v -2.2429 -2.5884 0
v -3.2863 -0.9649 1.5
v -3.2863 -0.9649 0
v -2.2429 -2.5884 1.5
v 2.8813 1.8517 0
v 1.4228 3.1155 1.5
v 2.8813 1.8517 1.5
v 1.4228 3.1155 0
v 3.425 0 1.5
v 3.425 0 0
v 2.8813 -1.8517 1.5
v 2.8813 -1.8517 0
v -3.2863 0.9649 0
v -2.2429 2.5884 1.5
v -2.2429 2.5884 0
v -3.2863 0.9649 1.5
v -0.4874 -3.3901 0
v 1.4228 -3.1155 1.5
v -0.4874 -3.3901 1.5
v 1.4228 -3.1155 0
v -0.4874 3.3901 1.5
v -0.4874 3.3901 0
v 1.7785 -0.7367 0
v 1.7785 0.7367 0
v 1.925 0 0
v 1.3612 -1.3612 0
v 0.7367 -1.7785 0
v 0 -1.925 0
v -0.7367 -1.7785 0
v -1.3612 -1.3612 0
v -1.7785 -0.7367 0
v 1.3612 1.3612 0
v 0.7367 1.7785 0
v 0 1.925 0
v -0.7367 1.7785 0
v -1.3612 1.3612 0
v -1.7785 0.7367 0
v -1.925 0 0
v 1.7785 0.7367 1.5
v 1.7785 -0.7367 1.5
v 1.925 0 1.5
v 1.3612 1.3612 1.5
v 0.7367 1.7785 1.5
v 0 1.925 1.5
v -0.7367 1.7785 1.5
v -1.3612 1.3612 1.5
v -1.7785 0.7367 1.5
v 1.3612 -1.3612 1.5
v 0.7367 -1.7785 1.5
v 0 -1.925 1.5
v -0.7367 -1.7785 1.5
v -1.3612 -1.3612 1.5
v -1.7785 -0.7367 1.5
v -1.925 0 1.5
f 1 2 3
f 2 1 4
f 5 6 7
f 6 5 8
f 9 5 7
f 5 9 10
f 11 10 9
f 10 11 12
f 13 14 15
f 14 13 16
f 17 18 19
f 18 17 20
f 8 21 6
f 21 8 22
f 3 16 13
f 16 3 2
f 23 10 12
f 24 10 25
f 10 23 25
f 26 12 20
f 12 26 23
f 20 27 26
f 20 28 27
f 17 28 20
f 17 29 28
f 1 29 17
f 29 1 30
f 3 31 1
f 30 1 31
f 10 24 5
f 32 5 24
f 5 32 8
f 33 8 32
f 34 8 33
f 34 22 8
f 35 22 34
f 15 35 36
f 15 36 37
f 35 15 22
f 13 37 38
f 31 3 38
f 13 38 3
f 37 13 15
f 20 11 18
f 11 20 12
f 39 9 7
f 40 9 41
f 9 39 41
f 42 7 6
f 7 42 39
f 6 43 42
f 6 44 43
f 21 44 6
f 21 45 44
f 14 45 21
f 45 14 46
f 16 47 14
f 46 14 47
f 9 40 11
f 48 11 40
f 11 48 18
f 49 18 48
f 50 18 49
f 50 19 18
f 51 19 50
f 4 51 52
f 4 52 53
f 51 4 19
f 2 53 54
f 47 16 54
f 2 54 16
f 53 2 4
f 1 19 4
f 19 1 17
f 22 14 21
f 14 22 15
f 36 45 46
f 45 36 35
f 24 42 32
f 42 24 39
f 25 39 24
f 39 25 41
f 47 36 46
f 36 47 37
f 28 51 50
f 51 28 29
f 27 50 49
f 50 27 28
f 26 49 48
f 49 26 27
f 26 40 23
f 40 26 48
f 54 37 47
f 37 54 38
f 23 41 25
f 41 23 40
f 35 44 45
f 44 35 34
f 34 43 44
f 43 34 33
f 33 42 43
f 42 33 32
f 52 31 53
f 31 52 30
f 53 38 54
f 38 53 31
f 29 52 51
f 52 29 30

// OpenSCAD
// file: roundedsquare.scad
module roundedSquare(size=[10,10], radius=1, center=false, $fn=16) {
    size1 = (size+0==size) ? [size,size] : size;
    if (radius <= 0) {
        square(size1, center=center);
    }
    else {
        translate(center ? -size1/2 : [0,0])
        hull() {
            translate([radius,radius]) circle(r=radius);
            translate([size1[0]-radius,radius]) circle(r=radius);
            translate([size1[0]-radius,size1[1]-radius]) circle(r=radius);
            translate([radius,size1[1]-radius]) circle(r=radius);
        }
    }
}

module roundedCube(size=[10,10,10], radius=1, center=false, $fn=16) {
    linear_extrude(height=size[2])
    roundedSquare(size=[size[0],size[1]], radius=radius, center=center);
}

module roundedOpenTopBox(size=[10,10,10], radius=2, wall=1, solid=false) {
    render(convexity=2)
    difference() {
        linear_extrude(height=size[2]) roundedSquare(size=[size[0],size[1]], radius=radius);
        if (!solid) {
            translate([0,0,wall])
            linear_extrude(height=size[2]-wall) 
            translate([wall,wall]) roundedSquare(size=[size[0]-2*wall,size[1]-2*wall], radius=radius-wall);
        }
    }
}
// main file
use <roundedsquare.scad>;

screwTolerance = 0.125;
screwHoleSize = 2.6;
maxScrewLength = 10;
screwHoleSize1 = screwHoleSize + 2*screwTolerance;

washer = true;

render(convexity=2)
if (washer) 
difference() {
    cylinder(h=1.5, d=screwHoleSize1+4);
    translate([0,0,-.5])
    cylinder(d=screwHoleSize1+1, h=4, $fn=16);
}
else
difference() {
    linear_extrude(height=5) roundedSquare(size=screwHoleSize1+3,radius=0.5,center=true);
    translate([0,0,-.5])
    cylinder(d=screwHoleSize1, h=6, $fn=16);
}
